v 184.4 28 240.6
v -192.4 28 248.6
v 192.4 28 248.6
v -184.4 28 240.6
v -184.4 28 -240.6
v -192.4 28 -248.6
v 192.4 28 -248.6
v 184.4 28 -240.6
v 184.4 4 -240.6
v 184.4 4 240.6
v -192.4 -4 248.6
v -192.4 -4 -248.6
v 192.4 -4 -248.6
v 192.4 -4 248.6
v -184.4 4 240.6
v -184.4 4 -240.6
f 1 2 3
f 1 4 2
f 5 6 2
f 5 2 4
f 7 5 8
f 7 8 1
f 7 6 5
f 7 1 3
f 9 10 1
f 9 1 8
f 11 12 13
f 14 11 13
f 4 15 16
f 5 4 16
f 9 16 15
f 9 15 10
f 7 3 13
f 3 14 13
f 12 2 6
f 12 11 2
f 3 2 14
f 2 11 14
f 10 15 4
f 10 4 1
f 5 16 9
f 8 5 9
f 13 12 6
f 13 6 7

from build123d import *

# Parameters (mm, degrees)
SKETCH1_W           = 384.8
SKETCH1_H           = 497.2
BOSS_EXTRUDE1_DEPTH = 4
SKETCH2_W           = 384.8
SKETCH2_H           = 497.2
SKETCH2_W_2         = 368.8
SKETCH2_H_2         = 481.2
BOSS_EXTRUDE2_DEPTH = 24


with BuildPart() as part:
    # Sketch1 → Boss-Extrude1 (new, symmetric)
    with BuildSketch(Plane(origin=(0, 0, 0), x_dir=(1, 0, 0), z_dir=(0, 1, 0))):
        Rectangle(SKETCH1_W, SKETCH1_H)
    extrude(amount=BOSS_EXTRUDE1_DEPTH, both=True)

    # Sketch2 → Boss-Extrude2 (add)
    with BuildSketch(Plane(origin=(0, 4, 0), x_dir=(1, 0, 0), z_dir=(0, 1, 0))):
        Rectangle(SKETCH2_W, SKETCH2_H)
        Rectangle(SKETCH2_W_2, SKETCH2_H_2, mode=Mode.SUBTRACT)
    extrude(amount=BOSS_EXTRUDE2_DEPTH)


solid = part.part
